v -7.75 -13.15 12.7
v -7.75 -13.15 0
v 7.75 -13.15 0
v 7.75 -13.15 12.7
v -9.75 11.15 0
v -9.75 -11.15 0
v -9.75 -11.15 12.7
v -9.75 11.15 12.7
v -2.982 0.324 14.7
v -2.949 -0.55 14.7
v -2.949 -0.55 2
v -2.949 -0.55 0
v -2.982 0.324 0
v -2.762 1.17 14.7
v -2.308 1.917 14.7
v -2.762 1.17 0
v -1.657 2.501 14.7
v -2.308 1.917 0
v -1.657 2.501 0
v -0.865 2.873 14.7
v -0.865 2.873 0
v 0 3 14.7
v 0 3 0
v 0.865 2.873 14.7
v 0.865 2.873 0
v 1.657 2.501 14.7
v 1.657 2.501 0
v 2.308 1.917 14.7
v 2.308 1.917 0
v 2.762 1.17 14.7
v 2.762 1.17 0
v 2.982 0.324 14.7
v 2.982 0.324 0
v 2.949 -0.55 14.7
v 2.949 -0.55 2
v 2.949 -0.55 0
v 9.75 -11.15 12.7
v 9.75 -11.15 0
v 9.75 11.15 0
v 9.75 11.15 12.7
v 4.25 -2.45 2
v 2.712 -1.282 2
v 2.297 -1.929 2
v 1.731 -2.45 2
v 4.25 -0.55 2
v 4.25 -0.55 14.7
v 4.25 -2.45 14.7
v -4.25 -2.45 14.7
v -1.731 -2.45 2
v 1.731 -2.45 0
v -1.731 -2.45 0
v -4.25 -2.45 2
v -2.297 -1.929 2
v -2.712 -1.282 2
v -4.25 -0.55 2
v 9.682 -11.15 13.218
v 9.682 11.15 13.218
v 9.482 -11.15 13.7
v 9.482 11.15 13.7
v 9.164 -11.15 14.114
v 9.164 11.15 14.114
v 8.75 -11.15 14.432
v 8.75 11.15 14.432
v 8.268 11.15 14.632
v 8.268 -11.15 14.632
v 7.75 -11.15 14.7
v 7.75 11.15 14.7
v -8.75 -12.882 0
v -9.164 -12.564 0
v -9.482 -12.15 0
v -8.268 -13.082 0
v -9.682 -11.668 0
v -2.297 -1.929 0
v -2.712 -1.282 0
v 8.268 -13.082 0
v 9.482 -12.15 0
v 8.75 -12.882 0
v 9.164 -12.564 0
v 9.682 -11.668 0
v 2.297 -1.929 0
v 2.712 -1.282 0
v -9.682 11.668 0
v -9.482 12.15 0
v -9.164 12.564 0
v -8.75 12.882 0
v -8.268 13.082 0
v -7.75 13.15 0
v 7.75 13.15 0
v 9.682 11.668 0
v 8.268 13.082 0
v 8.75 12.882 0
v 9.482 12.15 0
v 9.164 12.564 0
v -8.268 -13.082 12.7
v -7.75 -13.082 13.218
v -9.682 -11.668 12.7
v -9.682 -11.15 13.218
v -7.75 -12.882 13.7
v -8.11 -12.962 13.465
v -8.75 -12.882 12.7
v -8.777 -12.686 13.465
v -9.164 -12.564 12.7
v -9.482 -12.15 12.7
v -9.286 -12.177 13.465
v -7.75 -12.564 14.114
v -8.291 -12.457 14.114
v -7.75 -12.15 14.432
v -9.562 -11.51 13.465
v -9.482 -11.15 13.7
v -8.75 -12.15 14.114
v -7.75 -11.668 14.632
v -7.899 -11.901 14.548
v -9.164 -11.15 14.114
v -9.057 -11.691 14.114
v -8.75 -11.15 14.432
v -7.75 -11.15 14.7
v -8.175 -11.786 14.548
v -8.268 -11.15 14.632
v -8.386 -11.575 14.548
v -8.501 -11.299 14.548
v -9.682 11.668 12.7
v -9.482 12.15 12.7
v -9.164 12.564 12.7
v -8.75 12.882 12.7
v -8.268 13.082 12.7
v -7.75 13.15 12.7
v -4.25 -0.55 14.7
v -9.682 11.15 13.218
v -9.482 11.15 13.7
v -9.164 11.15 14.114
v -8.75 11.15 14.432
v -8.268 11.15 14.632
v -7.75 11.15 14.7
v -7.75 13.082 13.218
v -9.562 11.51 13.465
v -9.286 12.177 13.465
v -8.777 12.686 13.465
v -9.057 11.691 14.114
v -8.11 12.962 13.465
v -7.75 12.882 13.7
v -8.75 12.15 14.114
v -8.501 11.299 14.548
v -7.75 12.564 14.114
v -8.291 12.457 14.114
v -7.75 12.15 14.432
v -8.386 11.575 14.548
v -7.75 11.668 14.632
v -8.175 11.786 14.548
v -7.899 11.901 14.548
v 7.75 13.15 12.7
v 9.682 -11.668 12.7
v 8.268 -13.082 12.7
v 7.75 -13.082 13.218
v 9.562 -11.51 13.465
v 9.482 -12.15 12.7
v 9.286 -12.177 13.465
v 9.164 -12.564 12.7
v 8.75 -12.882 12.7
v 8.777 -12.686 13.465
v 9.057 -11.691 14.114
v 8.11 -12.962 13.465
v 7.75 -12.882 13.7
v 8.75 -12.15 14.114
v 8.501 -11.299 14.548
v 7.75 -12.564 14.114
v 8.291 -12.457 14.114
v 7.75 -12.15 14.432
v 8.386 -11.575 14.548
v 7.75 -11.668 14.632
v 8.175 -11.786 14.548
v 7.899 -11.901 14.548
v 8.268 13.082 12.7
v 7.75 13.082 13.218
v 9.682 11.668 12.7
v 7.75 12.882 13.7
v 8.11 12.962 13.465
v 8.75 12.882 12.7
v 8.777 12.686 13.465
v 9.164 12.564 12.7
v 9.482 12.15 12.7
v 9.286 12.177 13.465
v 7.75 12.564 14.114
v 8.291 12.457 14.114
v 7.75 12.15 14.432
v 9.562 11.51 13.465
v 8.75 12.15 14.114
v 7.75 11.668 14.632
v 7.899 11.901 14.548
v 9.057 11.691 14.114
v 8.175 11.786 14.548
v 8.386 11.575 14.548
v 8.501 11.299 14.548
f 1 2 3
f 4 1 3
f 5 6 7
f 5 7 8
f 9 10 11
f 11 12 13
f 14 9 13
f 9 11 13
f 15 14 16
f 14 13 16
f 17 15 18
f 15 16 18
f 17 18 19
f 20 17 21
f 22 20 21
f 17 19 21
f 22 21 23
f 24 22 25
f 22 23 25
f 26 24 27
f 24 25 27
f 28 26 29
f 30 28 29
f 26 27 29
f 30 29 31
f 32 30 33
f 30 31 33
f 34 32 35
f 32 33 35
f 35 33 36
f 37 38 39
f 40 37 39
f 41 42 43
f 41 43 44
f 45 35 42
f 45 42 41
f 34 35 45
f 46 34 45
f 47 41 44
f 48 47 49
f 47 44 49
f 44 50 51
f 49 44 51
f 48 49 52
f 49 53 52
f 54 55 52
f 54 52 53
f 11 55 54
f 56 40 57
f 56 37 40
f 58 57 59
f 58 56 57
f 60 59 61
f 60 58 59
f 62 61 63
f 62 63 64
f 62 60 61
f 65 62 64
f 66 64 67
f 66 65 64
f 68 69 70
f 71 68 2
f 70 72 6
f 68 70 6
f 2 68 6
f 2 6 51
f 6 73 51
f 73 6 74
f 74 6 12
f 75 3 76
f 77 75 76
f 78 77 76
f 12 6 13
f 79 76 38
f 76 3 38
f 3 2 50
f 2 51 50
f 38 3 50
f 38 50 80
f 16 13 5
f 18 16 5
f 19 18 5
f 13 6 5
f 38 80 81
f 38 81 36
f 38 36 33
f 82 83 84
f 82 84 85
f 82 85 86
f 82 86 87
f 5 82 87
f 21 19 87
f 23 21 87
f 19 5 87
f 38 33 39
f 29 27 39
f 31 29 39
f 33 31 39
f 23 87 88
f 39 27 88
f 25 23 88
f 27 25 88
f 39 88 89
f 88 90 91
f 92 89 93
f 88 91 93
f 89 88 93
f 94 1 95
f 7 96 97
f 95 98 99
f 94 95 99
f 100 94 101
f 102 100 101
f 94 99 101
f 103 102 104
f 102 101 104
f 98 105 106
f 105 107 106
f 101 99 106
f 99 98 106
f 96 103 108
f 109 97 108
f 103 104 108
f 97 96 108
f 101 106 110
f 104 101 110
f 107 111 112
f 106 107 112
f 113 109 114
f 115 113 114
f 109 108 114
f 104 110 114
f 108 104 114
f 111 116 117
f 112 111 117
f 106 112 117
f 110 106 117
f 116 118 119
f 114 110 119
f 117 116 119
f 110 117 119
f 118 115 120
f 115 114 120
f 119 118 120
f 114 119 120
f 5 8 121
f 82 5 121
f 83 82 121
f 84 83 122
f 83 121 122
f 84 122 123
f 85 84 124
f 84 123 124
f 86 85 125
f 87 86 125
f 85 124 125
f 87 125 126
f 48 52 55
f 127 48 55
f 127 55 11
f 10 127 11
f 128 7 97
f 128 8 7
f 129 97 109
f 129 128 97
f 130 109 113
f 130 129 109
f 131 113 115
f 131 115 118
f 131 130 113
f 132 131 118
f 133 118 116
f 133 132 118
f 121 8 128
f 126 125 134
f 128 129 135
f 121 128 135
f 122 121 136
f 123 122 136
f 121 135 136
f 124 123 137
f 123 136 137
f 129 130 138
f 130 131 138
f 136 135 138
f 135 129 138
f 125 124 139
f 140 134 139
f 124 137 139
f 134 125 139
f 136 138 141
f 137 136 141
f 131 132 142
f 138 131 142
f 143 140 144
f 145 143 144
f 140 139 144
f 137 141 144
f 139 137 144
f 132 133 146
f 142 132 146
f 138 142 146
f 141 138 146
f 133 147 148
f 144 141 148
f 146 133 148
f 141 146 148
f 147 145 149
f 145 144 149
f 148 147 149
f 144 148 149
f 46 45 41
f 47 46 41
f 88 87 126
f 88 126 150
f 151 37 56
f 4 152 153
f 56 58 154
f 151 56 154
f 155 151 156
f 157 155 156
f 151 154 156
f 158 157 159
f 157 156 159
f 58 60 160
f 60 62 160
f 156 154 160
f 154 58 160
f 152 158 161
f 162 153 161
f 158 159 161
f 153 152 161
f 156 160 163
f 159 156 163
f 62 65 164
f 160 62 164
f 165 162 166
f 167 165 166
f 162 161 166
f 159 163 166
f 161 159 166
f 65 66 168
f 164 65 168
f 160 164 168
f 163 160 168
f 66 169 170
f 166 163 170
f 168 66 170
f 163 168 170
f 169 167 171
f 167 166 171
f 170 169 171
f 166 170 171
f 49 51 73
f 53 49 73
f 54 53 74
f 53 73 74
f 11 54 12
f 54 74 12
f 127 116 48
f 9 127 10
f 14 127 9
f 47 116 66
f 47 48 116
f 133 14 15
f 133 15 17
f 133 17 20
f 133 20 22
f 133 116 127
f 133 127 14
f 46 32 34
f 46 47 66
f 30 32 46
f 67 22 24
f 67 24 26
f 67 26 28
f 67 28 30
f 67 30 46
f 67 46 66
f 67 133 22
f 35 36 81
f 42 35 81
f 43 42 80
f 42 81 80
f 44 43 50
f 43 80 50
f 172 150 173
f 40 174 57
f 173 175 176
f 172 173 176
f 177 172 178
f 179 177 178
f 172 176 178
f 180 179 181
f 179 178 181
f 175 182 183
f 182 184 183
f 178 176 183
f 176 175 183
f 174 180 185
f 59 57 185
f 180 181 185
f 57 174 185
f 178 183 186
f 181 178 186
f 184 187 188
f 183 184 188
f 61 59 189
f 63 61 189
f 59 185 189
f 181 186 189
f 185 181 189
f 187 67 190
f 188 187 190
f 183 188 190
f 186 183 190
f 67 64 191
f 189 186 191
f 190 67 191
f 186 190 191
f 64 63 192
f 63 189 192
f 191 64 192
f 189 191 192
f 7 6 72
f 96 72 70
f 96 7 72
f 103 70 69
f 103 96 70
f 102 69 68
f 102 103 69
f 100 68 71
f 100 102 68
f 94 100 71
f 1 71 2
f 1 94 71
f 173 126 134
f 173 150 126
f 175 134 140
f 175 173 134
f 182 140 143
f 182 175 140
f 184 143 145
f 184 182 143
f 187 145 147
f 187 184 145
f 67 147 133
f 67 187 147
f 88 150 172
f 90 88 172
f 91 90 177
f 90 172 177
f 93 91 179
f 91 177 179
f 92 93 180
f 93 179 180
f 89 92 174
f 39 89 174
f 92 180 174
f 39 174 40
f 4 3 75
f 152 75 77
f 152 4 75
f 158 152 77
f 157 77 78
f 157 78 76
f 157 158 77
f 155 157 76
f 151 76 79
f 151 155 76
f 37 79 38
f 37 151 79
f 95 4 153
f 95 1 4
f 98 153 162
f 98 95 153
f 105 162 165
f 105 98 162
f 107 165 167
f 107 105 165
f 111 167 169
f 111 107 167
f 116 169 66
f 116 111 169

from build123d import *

# Parameters (mm, degrees)
F0_W     = 19.5
F0_H     = 26.3
F1_DEPTH = 14.7
F2_R     = 2
F3_R     = 2
F4_DEPTH = 2


with BuildPart() as f1:
    # F0 (on Top) → F1 (new body)
    with BuildSketch(Plane.XY):
        Rectangle(F0_W, F0_H)
        with BuildLine():
            ThreePointArc((-2.949152, -0.55), (0, 3), (2.949152, -0.55))
            Line((2.949152, -0.55), (4.25, -0.55))
            Line((4.25, -0.55), (4.25, -2.45))
            Line((4.25, -2.45), (1.731329, -2.45))
            Line((1.731329, -2.45), (0, -2.45))
            Line((0, -2.45), (-1.731329, -2.45))
            Line((-1.731329, -2.45), (-4.25, -2.45))
            Line((-4.25, -2.45), (-4.25, -0.55))
            Line((-4.25, -0.55), (-2.949152, -0.55))
        make_face(mode=Mode.SUBTRACT)
    extrude(amount=F1_DEPTH)

    # F2
    f2_edges = [f1.edges().sort_by_distance(p)[0] for p in [
        (-9.75, 13.15, 7.35),
        (-9.75, -13.15, 7.35),
        (9.75, -13.15, 7.35),
        (9.75, 13.15, 7.35),
    ]]
    fillet(f2_edges, radius=F2_R)

    # F3
    f3_edges = [f1.edges().sort_by_distance(p)[0] for p in [
        (-9.75, 0, 14.7),
    ]]
    fillet(f3_edges, radius=F3_R)

    # F0 (on Top) → F4 (join)
    with BuildSketch(Plane.XY):
        with BuildLine():
            Line((4.25, -0.55), (2.949152, -0.55))
            ThreePointArc((2.949152, -0.55), (2.525713, -1.61888), (1.731329, -2.45))
            Line((1.731329, -2.45), (4.25, -2.45))
            Line((4.25, -2.45), (4.25, -0.55))
        make_face()
        with BuildLine():
            ThreePointArc((-1.731329, -2.45), (-2.525713, -1.61888), (-2.949152, -0.55))
            Line((-2.949152, -0.55), (-4.25, -0.55))
            Line((-4.25, -0.55), (-4.25, -2.45))
            Line((-4.25, -2.45), (-1.731329, -2.45))
        make_face()
    extrude(amount=F4_DEPTH)


solid = f1.part
